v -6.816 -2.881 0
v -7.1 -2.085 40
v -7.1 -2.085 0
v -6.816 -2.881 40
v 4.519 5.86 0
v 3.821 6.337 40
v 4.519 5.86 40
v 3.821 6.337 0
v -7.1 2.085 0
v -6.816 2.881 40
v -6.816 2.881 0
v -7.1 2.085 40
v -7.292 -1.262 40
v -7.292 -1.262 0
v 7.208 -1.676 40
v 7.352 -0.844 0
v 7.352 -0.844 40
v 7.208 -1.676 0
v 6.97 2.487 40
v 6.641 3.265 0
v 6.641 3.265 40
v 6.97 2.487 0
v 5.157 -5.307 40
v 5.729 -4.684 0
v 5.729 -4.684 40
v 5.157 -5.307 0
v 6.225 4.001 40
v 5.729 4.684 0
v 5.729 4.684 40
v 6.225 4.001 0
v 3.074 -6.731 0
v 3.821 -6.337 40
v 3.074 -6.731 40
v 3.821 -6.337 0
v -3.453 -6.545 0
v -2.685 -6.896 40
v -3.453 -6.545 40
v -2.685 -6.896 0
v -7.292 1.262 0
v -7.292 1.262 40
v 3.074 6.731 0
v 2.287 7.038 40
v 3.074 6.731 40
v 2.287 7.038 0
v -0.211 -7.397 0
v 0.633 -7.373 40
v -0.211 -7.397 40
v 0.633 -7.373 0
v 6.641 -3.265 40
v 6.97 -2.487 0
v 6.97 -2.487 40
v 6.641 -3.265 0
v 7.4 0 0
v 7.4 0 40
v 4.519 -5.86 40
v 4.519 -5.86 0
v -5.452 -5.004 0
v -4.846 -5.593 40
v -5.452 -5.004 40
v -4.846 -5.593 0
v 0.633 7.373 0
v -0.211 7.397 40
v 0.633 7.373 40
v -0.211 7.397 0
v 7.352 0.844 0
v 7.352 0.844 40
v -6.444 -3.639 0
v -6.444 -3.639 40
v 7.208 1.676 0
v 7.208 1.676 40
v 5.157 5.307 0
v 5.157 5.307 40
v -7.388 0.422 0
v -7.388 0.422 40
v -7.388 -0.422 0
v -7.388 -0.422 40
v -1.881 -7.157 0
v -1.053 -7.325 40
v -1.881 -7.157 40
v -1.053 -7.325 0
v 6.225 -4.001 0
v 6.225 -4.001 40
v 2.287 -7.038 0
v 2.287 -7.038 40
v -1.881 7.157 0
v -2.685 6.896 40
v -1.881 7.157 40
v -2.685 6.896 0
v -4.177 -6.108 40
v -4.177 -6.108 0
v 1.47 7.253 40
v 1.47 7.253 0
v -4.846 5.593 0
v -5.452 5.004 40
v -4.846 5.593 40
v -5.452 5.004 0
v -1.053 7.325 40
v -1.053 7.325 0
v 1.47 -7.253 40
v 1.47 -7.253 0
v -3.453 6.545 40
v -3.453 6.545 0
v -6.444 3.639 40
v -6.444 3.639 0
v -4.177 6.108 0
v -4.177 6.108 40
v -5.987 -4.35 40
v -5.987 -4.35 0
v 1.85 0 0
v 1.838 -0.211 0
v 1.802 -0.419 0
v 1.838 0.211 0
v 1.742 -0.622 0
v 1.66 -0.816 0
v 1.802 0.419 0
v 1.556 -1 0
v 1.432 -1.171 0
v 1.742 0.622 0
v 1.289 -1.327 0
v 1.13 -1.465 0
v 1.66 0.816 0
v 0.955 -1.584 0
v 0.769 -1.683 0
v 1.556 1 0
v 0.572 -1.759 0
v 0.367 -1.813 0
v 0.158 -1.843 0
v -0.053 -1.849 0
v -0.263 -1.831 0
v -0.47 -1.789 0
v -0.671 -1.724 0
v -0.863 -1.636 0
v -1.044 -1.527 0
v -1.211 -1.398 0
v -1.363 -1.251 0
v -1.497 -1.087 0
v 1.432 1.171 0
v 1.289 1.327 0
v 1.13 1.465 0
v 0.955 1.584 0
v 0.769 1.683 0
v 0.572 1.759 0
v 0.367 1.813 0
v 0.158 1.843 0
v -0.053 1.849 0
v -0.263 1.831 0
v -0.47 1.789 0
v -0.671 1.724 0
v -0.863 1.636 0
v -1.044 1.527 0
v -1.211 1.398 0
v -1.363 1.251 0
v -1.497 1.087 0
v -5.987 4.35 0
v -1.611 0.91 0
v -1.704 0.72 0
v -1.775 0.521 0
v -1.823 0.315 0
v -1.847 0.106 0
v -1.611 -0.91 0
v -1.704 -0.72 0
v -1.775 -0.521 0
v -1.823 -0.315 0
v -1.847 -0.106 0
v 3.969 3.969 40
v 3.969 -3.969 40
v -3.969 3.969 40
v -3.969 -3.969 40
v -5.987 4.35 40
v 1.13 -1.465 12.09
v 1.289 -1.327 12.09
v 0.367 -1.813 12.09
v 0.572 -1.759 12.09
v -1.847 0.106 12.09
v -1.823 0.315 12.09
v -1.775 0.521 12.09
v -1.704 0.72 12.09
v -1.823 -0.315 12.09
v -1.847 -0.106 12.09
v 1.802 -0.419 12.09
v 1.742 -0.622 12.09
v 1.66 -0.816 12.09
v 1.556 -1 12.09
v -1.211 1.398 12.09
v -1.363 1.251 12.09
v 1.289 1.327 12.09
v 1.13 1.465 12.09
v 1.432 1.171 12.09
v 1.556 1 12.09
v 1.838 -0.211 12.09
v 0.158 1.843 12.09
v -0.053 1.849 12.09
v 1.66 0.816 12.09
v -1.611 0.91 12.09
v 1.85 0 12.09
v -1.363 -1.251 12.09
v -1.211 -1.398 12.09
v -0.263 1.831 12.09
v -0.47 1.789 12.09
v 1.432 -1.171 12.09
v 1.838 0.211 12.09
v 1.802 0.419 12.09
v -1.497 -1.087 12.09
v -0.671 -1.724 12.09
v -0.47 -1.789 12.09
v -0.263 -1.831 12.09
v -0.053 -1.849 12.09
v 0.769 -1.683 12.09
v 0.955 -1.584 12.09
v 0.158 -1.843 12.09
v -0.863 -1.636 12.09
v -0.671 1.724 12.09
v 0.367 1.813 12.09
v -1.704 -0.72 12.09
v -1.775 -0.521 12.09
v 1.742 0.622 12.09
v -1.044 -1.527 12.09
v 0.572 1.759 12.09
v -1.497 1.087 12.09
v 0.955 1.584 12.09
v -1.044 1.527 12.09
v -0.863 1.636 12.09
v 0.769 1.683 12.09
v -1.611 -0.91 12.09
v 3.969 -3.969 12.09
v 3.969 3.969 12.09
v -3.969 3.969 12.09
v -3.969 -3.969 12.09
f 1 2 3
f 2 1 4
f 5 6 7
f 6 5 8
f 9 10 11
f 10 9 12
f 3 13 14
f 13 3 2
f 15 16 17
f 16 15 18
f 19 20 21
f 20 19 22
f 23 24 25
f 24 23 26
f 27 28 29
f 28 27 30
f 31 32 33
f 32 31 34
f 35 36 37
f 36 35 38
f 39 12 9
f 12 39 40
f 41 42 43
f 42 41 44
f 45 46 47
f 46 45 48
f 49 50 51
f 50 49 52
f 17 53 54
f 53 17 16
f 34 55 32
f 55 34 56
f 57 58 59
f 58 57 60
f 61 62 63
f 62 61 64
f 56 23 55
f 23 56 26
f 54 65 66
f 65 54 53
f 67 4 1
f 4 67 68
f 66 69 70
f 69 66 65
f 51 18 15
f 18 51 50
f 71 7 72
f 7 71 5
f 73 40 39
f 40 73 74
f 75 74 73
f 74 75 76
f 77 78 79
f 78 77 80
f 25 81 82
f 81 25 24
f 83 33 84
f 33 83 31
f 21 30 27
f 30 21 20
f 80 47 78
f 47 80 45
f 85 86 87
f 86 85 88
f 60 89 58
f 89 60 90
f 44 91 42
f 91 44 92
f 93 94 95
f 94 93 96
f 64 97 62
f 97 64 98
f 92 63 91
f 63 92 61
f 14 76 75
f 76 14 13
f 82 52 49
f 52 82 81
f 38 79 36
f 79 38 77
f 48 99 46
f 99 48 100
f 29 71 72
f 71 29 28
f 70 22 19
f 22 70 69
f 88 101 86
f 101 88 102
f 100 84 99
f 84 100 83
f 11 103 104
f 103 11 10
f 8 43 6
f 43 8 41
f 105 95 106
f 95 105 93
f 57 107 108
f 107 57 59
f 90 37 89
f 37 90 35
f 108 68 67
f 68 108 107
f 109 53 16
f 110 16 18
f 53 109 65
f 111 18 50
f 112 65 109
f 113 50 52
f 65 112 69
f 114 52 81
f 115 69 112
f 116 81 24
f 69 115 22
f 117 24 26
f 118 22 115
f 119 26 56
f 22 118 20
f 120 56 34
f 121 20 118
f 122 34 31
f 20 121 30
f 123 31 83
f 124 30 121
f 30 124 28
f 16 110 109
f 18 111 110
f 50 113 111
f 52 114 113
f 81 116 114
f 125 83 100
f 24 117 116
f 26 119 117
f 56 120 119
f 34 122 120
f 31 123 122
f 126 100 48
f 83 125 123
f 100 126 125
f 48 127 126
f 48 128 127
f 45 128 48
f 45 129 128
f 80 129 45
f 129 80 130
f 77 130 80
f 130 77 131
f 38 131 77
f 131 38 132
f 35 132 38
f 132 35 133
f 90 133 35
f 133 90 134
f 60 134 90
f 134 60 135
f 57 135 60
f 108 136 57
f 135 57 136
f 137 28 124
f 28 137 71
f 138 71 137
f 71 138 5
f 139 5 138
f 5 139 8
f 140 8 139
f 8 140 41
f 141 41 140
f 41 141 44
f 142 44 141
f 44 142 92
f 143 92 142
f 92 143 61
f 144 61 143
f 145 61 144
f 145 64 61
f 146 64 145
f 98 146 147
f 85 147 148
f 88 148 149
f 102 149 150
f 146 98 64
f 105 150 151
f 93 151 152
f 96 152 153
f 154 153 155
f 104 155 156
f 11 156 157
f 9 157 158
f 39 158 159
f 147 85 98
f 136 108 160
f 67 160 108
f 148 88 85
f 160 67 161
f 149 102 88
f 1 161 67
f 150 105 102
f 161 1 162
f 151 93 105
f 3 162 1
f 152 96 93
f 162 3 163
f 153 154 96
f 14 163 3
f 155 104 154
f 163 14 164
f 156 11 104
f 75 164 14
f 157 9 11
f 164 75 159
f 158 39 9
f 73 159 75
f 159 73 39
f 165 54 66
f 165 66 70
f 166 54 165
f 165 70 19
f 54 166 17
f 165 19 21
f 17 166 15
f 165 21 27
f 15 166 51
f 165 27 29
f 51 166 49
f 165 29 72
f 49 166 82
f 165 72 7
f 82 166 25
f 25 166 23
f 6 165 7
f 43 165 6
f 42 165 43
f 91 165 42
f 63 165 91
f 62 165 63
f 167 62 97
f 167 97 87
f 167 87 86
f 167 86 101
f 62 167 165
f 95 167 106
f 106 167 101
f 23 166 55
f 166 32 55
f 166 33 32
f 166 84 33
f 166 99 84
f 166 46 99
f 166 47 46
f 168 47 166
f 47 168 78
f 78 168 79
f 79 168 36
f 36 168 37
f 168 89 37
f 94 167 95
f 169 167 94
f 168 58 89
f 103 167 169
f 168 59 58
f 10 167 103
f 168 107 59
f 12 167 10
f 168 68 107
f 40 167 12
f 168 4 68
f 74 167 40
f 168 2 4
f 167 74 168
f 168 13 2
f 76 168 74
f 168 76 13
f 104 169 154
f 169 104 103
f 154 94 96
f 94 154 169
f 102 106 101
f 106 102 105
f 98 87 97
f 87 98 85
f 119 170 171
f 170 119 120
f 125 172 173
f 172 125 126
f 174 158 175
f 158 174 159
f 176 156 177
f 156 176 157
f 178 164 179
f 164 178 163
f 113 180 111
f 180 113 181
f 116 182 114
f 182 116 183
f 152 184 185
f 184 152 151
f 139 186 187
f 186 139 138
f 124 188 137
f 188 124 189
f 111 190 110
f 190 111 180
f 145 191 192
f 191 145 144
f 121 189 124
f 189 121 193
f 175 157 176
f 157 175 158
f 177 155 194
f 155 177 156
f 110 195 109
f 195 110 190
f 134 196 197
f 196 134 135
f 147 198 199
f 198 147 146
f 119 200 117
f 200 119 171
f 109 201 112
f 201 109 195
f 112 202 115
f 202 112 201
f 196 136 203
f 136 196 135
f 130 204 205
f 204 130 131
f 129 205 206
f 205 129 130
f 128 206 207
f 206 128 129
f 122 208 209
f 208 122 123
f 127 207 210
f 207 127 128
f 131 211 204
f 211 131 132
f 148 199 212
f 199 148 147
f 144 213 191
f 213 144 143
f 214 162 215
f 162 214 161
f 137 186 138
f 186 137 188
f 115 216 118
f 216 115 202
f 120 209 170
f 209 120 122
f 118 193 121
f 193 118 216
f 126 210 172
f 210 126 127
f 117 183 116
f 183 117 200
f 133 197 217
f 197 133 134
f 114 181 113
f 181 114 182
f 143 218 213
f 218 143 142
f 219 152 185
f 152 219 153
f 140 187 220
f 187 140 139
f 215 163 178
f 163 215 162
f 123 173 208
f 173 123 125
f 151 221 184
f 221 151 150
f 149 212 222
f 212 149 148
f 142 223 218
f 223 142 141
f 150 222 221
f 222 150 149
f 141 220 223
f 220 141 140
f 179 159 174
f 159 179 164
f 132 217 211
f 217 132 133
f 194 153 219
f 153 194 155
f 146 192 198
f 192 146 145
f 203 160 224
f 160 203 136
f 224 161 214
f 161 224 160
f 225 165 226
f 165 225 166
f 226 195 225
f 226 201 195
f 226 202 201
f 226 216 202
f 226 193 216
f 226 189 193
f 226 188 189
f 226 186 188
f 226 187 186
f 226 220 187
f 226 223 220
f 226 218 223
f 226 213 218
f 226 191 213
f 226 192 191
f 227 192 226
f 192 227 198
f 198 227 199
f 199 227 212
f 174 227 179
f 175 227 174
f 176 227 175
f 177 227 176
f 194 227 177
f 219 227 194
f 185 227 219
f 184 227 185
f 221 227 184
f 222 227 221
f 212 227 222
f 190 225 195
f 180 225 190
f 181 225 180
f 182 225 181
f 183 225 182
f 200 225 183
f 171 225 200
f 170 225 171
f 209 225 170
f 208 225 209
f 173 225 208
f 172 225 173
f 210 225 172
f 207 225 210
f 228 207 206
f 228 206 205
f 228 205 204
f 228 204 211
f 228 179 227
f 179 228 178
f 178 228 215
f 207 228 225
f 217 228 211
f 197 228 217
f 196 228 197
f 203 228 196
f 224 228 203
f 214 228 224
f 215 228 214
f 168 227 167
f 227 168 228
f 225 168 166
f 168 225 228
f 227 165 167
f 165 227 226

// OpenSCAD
// [FL_INDEX: keywords="openscad, 3d_parametric, Customizable_Round_Foot_for_Bolt_and_Square_Nut, csg_solid" | COT="Parametric OpenSCAD design from 3DCodeverse"]
// Title: Customizable Round Foot for Bolt and Square Nut

// Generic foot with #6 bolt and #6 square nut
// Al Williams (al.williams@awce.com or @awce_com)
// Hacked to fit with Customizer template

//	Uncomment the library/libraries of your choice to include them


//CUSTOMIZER VARIABLES

// Units for all custom variables
Units=1;  // [1:mm, 25.4:inches, 0.254:mils]
// Diameter of screw holes, 3.7mm = #6 clearance hole.  if your printer is a little "tight" you might open it up a bit
Bolt_Size=3.7; 
boltsize=Bolt_Size*Units;
// How deep do you want the bolt hole? Should be slightly shorter than the bolt so the nut can engage
Bolt_Depth=12.2;  
boltdepth=Bolt_Depth*Units;
// Size of the square nut (example #6 nut is 5/16 inch which is 7.9375 mm)
Nut_Size=7.9375;
nutsize=Nut_Size*Units;
// Foot height
Total_Height=40;
totalh=Total_Height*Units;


totalw=boltsize*4;    // diameter not radius!

// the .1 fudge factor here makes sure
// there is a clean cut between the bolt hole
// and the nut hole
nutdepth=(totalh-boltdepth)+0.1;


//CUSTOMIZER VARIABLES END


$fn=55+0; // # of arcs in a circle -- higher is better but runs longer

// Some measurements are in inches (original)
in2mm=25.4+0;




// mounting bolt hole
module bolthole()
{
// the .02 makes it stretch a little past the edge
// so the cut is clean
  translate([0,0,totalh-boltdepth])
    cylinder(h=boltdepth+.02,r=boltsize/2); 
    
}

module nuthole()
{
// The .02 makes it stretch a little past the edge
// so the cut is clean
translate([0,0,nutdepth/2])
   {
     cube(size=[nutsize,nutsize, nutdepth+.02],center=true); 
    }
}


// Here we go (translate and rotate so big end is up for printing)
translate([0,0,totalh])
rotate ([180,0,0]) difference () {
    cylinder(r=totalw/2,h=totalh,center=false);
    bolthole();
    nuthole();
}
